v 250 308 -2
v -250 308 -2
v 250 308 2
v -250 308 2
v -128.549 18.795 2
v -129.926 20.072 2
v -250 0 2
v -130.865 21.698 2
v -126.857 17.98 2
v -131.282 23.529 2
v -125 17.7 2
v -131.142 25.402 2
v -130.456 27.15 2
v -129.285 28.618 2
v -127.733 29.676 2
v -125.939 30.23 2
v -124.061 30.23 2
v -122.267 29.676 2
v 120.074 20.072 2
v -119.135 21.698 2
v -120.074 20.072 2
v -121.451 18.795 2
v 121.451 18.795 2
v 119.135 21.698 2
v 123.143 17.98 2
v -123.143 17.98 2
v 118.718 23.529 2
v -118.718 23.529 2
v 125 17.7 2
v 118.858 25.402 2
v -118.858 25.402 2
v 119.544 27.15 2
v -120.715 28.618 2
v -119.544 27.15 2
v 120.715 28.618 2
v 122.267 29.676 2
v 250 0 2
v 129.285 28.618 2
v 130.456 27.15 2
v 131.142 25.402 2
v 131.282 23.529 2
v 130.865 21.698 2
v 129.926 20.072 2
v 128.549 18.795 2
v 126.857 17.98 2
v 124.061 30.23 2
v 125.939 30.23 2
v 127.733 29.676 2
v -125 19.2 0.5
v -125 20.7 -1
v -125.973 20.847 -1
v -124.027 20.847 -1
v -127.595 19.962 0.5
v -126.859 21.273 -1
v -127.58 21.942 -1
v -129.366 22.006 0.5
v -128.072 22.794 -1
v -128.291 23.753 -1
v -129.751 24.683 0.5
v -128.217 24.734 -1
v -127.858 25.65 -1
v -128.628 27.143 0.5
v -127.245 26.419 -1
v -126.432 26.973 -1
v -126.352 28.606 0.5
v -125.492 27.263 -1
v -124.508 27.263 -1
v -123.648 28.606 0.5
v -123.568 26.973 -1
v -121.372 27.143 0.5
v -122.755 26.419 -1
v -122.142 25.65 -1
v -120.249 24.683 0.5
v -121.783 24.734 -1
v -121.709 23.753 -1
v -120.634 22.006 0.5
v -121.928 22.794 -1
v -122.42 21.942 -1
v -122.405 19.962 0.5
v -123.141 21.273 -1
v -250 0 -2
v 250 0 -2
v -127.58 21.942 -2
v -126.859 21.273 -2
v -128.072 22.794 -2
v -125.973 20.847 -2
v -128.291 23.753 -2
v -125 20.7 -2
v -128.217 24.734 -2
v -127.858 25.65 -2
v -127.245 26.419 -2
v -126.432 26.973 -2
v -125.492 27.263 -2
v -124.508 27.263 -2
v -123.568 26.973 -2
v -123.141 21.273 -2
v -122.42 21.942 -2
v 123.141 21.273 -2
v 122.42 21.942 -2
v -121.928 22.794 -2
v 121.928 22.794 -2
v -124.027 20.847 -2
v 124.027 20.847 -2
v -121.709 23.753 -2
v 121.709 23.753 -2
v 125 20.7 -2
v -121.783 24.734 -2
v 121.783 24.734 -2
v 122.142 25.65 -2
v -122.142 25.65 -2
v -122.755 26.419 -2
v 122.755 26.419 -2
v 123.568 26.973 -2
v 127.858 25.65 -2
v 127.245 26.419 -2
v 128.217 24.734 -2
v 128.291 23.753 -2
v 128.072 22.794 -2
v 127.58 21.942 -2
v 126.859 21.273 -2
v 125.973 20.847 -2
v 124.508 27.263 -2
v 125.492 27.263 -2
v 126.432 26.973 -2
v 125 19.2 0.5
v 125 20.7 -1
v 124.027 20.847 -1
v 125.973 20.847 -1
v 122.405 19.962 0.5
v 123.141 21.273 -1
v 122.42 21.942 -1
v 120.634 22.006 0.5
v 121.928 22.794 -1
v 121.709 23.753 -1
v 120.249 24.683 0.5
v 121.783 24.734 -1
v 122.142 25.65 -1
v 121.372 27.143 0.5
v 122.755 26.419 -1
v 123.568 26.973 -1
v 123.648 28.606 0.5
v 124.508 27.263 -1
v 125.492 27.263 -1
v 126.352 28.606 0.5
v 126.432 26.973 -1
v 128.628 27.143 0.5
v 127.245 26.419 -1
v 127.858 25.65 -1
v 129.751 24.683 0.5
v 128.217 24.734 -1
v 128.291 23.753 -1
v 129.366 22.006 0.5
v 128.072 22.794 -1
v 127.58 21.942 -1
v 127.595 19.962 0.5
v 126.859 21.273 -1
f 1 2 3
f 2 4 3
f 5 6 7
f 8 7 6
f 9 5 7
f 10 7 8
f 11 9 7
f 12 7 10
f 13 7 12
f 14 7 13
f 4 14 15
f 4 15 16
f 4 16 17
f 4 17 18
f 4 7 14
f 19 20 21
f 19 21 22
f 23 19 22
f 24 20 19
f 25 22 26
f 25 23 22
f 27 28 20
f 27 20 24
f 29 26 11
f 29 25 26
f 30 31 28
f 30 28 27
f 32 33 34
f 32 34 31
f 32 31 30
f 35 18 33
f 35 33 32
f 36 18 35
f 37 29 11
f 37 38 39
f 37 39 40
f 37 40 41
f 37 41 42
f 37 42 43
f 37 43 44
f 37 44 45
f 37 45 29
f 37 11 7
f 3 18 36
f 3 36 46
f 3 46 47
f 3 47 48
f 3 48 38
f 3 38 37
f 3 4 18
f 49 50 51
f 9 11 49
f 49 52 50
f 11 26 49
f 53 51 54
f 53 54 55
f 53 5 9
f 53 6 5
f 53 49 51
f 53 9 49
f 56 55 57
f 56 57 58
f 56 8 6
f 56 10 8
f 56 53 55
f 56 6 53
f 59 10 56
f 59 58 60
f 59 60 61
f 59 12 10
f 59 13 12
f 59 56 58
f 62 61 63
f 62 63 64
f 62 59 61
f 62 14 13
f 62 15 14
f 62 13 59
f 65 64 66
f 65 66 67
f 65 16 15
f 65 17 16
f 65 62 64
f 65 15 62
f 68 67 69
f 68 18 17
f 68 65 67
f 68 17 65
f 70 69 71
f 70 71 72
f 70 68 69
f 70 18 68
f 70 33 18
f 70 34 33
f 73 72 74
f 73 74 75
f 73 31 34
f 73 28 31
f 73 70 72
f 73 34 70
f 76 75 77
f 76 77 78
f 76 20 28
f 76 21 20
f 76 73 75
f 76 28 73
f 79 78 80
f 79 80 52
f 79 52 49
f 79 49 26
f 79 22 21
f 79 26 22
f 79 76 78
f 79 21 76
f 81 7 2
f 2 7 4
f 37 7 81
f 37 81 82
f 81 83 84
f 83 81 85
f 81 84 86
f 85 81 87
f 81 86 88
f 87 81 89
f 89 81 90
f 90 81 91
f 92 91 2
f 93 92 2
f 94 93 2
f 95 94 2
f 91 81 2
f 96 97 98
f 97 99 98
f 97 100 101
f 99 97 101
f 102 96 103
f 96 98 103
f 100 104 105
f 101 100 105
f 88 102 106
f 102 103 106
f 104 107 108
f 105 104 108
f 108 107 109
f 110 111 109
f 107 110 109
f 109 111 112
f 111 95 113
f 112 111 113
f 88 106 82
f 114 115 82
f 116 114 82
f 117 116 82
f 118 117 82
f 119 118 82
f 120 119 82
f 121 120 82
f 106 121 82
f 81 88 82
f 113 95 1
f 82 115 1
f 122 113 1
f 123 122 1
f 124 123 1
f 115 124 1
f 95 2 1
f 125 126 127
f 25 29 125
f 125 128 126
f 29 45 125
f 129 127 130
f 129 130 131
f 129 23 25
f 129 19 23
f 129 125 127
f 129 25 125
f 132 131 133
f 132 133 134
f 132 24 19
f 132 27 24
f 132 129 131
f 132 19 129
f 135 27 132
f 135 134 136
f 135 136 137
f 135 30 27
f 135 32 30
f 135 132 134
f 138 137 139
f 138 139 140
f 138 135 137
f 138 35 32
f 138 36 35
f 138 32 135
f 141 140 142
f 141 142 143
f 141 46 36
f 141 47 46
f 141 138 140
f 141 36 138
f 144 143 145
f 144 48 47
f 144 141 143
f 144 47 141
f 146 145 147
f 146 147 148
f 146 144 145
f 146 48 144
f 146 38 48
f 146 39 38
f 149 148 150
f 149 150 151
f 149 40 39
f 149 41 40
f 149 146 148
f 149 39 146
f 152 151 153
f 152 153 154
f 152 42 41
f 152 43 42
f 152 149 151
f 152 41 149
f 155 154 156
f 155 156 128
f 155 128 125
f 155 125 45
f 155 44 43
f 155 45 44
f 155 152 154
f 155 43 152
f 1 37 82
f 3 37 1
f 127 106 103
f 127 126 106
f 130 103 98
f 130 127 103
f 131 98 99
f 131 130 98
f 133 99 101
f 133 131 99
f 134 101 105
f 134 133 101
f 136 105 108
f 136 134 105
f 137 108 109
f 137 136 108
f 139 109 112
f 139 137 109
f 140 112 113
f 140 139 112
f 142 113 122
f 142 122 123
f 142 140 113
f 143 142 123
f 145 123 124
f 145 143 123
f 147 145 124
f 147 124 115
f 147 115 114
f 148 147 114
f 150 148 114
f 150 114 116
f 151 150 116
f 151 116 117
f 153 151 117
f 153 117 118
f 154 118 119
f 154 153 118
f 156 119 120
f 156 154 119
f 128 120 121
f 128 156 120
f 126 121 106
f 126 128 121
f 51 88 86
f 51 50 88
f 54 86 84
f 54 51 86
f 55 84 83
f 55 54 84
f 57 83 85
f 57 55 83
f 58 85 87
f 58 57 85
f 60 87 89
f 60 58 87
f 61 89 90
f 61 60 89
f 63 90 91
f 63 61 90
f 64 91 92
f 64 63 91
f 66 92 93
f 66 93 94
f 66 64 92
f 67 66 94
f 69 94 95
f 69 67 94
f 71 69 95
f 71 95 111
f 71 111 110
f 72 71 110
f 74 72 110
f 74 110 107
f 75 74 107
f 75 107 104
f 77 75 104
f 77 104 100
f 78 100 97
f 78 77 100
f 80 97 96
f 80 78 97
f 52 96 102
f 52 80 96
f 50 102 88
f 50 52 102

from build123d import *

# Parameters (mm, degrees)
SKETCH1_W                                    = 500
SKETCH1_H                                    = 308
BOSS_EXTRUDE1_DEPTH                          = 2
CSK_FOR_M6_COUNTERSUNK_FLAT_HEAD_SCR_2_COUNT = 2
CSK_FOR_M6_COUNTERSUNK_FLAT_HEAD_SCR_2_PITCH = 250


with BuildPart() as part:
    # Sketch1 → Boss-Extrude1 (new, symmetric)
    with BuildSketch(Plane.XY):
        with Locations((0, 154)):
            Rectangle(SKETCH1_W, SKETCH1_H)
    extrude(amount=BOSS_EXTRUDE1_DEPTH, both=True)

    # Sketch6 → CSK for M6 Countersunk Flat Head Screw2 (revolve, cut)
    with BuildSketch(Plane(origin=(-125, 24, 2), x_dir=(0, -1, 0), z_dir=(1, 0, 0))):
        Polygon((0, 0), (0, 4), (3.3, 4), (3.3, 3), (6.3, 0), align=None)
    csk_for_m6_countersunk_flat_head_screw2 = revolve(axis=Axis((-125, 24, 8.35), (0, 0, -1)), mode=Mode.SUBTRACT)

    # CSK for M6 Countersunk Flat Head Scr 2: CSK for M6 Countersunk Flat Head Screw2 ×2
    with Locations(*[(i * CSK_FOR_M6_COUNTERSUNK_FLAT_HEAD_SCR_2_PITCH, 0, 0) for i in range(1, CSK_FOR_M6_COUNTERSUNK_FLAT_HEAD_SCR_2_COUNT)]):
        add(csk_for_m6_countersunk_flat_head_screw2, mode=Mode.SUBTRACT)


solid = part.part
